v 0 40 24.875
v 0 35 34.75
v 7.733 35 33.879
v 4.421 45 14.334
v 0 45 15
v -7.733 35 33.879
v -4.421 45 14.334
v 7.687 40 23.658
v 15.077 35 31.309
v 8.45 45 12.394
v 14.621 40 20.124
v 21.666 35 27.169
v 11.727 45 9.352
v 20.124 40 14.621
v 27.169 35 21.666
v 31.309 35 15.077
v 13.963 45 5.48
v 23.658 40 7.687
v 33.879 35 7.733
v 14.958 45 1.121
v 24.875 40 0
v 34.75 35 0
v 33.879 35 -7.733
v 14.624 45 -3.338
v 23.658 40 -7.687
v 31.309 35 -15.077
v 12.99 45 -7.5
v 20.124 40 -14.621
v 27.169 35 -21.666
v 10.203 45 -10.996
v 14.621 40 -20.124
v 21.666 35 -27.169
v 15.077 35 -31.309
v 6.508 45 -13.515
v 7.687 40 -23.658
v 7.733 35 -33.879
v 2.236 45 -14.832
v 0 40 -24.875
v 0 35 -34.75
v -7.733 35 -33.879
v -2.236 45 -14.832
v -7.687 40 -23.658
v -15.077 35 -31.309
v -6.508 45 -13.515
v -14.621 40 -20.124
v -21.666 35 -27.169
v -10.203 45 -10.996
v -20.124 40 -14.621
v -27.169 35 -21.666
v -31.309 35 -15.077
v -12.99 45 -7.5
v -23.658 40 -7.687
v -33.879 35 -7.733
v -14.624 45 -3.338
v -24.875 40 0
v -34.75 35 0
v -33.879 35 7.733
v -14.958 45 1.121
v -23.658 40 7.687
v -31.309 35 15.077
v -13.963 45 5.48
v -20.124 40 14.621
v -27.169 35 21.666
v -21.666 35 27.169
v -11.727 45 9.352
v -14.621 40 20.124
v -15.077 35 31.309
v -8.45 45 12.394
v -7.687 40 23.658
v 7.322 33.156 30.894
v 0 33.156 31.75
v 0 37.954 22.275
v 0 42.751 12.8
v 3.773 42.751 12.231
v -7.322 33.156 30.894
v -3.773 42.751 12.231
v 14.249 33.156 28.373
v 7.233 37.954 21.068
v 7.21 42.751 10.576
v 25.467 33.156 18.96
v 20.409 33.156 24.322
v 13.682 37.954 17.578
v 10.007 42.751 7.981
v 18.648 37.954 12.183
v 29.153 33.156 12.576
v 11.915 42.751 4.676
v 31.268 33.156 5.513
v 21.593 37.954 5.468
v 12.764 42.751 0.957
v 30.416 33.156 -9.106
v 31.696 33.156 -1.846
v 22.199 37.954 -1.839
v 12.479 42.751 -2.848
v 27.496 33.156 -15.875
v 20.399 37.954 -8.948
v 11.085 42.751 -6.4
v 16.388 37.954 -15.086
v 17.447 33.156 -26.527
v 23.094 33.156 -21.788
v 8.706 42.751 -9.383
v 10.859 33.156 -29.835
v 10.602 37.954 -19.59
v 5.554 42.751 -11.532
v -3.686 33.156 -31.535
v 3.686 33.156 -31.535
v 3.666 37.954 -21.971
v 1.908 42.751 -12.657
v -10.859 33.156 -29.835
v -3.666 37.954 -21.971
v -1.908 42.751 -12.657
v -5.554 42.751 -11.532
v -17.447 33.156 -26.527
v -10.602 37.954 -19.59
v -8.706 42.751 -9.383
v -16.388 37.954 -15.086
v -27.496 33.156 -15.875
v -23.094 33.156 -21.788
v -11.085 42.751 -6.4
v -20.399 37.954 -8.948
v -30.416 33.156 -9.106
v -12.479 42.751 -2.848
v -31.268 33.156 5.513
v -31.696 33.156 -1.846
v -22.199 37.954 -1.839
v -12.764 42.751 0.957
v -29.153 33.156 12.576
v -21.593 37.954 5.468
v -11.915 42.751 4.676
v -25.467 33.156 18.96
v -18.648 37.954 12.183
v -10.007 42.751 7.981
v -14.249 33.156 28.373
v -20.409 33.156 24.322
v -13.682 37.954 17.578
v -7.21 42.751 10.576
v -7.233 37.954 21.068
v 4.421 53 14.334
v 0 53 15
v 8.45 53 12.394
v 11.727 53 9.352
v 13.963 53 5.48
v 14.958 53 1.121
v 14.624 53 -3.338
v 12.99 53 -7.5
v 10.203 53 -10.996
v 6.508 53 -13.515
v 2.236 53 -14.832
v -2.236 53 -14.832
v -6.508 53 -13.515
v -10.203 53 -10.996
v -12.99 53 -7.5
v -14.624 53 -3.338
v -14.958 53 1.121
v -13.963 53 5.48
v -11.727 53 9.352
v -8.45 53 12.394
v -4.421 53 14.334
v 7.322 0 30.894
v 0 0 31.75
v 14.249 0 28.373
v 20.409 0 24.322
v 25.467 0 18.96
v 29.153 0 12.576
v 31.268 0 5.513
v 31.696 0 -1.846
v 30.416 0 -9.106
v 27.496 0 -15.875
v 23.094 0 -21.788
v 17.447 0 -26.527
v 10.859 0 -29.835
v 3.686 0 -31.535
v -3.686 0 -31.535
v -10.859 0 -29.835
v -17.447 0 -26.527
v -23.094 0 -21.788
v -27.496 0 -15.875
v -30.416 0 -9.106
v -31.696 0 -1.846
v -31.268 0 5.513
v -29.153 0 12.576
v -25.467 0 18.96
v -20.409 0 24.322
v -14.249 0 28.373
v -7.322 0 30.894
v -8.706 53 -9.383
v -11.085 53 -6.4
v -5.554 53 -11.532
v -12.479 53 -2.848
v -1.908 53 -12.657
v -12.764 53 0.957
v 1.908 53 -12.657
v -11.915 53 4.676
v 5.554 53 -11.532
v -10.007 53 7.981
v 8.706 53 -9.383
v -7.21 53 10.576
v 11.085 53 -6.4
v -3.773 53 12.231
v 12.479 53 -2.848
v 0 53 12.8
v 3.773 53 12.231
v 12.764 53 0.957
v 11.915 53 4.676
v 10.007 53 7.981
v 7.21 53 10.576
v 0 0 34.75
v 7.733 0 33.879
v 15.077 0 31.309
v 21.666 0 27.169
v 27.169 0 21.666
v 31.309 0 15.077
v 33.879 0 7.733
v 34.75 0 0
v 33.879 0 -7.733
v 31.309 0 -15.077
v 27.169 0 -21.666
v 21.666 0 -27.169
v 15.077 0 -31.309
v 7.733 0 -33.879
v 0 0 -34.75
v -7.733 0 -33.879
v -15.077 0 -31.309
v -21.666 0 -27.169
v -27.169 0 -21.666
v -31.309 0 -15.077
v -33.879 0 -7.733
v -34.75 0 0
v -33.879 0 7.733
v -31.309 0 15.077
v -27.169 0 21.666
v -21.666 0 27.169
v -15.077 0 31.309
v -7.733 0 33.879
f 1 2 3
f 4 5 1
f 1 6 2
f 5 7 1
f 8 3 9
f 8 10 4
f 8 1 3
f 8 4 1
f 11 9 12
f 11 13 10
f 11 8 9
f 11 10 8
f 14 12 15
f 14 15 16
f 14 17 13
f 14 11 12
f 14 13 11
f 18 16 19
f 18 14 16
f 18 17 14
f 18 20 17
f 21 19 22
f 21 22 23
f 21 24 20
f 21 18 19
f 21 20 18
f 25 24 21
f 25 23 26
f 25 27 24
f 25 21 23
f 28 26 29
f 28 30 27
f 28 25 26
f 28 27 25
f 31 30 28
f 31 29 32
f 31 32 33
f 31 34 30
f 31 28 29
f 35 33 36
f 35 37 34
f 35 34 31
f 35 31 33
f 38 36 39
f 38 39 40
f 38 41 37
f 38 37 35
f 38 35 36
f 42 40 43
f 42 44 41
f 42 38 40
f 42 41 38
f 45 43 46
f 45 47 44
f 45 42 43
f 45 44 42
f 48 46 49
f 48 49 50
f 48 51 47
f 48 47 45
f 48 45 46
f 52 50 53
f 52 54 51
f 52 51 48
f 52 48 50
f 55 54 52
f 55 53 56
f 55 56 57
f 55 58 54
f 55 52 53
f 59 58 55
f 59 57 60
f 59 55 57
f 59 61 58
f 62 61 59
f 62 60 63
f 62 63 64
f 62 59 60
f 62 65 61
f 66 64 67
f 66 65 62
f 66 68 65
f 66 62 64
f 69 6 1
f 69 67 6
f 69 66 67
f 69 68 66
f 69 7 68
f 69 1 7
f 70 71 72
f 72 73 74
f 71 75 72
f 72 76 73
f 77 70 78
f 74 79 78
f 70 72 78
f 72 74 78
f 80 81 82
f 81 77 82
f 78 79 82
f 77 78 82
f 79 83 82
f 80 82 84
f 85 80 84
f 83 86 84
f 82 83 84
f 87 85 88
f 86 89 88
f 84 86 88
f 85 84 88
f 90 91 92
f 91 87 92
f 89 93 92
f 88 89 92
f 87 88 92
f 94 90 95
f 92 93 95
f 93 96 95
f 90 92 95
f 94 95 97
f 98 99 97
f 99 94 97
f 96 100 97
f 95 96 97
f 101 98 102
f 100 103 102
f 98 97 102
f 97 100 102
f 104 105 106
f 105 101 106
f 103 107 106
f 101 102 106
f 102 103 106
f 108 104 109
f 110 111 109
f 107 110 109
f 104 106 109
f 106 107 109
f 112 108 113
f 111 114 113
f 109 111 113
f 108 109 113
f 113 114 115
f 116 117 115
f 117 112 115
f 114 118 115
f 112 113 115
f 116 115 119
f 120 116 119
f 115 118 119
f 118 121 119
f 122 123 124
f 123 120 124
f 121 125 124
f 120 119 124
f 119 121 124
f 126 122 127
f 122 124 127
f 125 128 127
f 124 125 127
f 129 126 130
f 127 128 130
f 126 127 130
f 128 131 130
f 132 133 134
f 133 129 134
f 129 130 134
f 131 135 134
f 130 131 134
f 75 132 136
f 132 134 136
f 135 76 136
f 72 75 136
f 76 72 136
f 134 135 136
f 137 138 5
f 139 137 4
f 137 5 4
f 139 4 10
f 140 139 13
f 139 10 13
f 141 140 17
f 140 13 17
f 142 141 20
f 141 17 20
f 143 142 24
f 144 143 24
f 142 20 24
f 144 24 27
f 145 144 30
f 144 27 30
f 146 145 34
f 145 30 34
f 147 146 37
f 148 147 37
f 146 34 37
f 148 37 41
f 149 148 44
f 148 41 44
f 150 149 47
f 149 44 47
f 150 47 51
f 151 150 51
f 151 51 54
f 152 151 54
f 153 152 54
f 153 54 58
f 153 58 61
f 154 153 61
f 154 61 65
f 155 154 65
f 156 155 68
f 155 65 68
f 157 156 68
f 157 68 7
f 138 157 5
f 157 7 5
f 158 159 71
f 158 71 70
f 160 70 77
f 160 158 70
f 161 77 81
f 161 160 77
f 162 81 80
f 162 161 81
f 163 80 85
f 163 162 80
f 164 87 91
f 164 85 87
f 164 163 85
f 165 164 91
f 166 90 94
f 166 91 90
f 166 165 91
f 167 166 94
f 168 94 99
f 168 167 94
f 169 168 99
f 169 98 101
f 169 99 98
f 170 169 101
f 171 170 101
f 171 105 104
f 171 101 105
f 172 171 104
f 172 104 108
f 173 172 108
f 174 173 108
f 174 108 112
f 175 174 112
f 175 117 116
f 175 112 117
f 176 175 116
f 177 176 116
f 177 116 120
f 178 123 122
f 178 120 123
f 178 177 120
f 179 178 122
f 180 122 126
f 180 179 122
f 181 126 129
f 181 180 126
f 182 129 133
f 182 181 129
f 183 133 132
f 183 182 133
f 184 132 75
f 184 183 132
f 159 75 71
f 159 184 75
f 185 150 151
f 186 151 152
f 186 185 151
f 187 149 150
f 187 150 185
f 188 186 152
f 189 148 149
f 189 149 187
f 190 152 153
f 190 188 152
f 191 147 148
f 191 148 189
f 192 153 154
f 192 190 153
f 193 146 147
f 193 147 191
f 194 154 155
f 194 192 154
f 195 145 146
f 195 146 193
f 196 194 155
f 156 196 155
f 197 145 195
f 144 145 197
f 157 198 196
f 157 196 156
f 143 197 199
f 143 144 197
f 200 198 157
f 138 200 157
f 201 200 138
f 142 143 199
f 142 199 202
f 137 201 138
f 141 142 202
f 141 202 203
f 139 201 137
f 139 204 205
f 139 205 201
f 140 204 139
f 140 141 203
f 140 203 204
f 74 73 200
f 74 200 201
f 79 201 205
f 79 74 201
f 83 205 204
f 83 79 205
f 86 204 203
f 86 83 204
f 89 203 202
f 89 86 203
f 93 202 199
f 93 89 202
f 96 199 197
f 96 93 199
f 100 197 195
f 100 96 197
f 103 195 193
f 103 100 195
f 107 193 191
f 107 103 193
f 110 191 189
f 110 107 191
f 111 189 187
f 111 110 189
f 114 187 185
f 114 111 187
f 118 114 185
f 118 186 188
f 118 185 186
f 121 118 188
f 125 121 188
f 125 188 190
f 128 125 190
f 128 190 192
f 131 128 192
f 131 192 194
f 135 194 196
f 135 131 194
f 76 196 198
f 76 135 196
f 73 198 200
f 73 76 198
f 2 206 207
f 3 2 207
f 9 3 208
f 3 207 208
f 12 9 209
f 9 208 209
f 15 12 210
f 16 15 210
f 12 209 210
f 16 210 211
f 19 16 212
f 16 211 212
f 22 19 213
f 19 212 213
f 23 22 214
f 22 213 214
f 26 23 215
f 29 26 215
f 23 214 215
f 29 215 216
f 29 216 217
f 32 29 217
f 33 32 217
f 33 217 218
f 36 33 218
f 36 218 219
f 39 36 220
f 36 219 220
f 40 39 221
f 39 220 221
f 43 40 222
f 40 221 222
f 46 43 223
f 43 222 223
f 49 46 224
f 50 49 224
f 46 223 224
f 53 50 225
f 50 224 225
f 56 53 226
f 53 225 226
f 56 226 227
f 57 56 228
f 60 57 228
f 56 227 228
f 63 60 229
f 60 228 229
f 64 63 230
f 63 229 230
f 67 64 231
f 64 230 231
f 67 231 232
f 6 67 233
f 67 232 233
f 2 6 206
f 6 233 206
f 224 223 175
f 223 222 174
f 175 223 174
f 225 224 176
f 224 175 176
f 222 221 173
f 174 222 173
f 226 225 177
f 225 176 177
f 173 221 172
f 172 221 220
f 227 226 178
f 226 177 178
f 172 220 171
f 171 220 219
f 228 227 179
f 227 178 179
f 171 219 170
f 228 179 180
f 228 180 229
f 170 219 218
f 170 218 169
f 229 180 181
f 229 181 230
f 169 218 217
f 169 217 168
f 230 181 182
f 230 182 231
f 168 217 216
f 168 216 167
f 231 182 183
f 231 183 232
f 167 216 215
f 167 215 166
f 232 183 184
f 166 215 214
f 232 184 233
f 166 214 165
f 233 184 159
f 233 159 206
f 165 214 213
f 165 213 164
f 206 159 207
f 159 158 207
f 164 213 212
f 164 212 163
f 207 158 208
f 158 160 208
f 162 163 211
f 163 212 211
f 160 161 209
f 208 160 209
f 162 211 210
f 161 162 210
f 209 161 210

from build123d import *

# Parameters (mm, degrees)
SKETCH_1_R               = 34.75
EXTRUDE_1_DEPTH          = 35
SKETCH_2_R               = 15
EXTRUDE_2_DEPTH          = 8
SHELL_2_T                = -3
CUT_EXTRUDE_1_DEPTH      = 73.278108815
CUT_EXTRUDE_1_DEPTH_BACK = 73.278108815
SKETCH_3_R               = 12.8


with BuildPart() as part:
    # 스케치1 → 보스-돌출1 (new body)
    with BuildSketch(Plane(origin=(0, 0, 0), x_dir=(1, 0, 0), z_dir=(0, 1, 0))):
        with Locations(Location((0, 0, 0), (0, 0, 270))):
            Circle(SKETCH_1_R)
    extrude(amount=EXTRUDE_1_DEPTH)



with BuildPart() as body_2:
    # 스케치2 → 보스-돌출2 (new body)
    with BuildSketch(Plane(origin=(0, 45, 0), x_dir=(1, 0, 0), z_dir=(0, 1, 0))):
        with Locations(Location((0, 0, 0), (0, 0, 270))):
            Circle(SKETCH_2_R)
    extrude(amount=EXTRUDE_2_DEPTH)


with BuildPart() as part_1:
    add(part.part)

    add(body_2.part)  # loft_1 joins it to this body
    # loft from a face of the part (loft_1)
    loft([part_1.faces().sort_by_distance((0, 35, 0))[0], part_1.faces().sort_by_distance((0, 45, 0))[0]])

    # 쉘2
    shell_2_openings = [part_1.faces().sort_by_distance(p)[0] for p in [
        (0, 0, 0),
    ]]
    offset(amount=SHELL_2_T, openings=shell_2_openings, kind=Kind.INTERSECTION)

    # 스케치3 → 컷-돌출1 (cut, two sides: drawn at the far end of the back side and taken through both)
    with BuildSketch(Plane(origin=(0, 53, 0), x_dir=(1, 0, 0), z_dir=(0, 1, 0)).offset(-CUT_EXTRUDE_1_DEPTH_BACK)):
        with Locations(Location((0, 0, 0), (0, 0, 270))):
            Circle(SKETCH_3_R)
    extrude(amount=CUT_EXTRUDE_1_DEPTH + CUT_EXTRUDE_1_DEPTH_BACK, mode=Mode.SUBTRACT)


solid = part_1.part
